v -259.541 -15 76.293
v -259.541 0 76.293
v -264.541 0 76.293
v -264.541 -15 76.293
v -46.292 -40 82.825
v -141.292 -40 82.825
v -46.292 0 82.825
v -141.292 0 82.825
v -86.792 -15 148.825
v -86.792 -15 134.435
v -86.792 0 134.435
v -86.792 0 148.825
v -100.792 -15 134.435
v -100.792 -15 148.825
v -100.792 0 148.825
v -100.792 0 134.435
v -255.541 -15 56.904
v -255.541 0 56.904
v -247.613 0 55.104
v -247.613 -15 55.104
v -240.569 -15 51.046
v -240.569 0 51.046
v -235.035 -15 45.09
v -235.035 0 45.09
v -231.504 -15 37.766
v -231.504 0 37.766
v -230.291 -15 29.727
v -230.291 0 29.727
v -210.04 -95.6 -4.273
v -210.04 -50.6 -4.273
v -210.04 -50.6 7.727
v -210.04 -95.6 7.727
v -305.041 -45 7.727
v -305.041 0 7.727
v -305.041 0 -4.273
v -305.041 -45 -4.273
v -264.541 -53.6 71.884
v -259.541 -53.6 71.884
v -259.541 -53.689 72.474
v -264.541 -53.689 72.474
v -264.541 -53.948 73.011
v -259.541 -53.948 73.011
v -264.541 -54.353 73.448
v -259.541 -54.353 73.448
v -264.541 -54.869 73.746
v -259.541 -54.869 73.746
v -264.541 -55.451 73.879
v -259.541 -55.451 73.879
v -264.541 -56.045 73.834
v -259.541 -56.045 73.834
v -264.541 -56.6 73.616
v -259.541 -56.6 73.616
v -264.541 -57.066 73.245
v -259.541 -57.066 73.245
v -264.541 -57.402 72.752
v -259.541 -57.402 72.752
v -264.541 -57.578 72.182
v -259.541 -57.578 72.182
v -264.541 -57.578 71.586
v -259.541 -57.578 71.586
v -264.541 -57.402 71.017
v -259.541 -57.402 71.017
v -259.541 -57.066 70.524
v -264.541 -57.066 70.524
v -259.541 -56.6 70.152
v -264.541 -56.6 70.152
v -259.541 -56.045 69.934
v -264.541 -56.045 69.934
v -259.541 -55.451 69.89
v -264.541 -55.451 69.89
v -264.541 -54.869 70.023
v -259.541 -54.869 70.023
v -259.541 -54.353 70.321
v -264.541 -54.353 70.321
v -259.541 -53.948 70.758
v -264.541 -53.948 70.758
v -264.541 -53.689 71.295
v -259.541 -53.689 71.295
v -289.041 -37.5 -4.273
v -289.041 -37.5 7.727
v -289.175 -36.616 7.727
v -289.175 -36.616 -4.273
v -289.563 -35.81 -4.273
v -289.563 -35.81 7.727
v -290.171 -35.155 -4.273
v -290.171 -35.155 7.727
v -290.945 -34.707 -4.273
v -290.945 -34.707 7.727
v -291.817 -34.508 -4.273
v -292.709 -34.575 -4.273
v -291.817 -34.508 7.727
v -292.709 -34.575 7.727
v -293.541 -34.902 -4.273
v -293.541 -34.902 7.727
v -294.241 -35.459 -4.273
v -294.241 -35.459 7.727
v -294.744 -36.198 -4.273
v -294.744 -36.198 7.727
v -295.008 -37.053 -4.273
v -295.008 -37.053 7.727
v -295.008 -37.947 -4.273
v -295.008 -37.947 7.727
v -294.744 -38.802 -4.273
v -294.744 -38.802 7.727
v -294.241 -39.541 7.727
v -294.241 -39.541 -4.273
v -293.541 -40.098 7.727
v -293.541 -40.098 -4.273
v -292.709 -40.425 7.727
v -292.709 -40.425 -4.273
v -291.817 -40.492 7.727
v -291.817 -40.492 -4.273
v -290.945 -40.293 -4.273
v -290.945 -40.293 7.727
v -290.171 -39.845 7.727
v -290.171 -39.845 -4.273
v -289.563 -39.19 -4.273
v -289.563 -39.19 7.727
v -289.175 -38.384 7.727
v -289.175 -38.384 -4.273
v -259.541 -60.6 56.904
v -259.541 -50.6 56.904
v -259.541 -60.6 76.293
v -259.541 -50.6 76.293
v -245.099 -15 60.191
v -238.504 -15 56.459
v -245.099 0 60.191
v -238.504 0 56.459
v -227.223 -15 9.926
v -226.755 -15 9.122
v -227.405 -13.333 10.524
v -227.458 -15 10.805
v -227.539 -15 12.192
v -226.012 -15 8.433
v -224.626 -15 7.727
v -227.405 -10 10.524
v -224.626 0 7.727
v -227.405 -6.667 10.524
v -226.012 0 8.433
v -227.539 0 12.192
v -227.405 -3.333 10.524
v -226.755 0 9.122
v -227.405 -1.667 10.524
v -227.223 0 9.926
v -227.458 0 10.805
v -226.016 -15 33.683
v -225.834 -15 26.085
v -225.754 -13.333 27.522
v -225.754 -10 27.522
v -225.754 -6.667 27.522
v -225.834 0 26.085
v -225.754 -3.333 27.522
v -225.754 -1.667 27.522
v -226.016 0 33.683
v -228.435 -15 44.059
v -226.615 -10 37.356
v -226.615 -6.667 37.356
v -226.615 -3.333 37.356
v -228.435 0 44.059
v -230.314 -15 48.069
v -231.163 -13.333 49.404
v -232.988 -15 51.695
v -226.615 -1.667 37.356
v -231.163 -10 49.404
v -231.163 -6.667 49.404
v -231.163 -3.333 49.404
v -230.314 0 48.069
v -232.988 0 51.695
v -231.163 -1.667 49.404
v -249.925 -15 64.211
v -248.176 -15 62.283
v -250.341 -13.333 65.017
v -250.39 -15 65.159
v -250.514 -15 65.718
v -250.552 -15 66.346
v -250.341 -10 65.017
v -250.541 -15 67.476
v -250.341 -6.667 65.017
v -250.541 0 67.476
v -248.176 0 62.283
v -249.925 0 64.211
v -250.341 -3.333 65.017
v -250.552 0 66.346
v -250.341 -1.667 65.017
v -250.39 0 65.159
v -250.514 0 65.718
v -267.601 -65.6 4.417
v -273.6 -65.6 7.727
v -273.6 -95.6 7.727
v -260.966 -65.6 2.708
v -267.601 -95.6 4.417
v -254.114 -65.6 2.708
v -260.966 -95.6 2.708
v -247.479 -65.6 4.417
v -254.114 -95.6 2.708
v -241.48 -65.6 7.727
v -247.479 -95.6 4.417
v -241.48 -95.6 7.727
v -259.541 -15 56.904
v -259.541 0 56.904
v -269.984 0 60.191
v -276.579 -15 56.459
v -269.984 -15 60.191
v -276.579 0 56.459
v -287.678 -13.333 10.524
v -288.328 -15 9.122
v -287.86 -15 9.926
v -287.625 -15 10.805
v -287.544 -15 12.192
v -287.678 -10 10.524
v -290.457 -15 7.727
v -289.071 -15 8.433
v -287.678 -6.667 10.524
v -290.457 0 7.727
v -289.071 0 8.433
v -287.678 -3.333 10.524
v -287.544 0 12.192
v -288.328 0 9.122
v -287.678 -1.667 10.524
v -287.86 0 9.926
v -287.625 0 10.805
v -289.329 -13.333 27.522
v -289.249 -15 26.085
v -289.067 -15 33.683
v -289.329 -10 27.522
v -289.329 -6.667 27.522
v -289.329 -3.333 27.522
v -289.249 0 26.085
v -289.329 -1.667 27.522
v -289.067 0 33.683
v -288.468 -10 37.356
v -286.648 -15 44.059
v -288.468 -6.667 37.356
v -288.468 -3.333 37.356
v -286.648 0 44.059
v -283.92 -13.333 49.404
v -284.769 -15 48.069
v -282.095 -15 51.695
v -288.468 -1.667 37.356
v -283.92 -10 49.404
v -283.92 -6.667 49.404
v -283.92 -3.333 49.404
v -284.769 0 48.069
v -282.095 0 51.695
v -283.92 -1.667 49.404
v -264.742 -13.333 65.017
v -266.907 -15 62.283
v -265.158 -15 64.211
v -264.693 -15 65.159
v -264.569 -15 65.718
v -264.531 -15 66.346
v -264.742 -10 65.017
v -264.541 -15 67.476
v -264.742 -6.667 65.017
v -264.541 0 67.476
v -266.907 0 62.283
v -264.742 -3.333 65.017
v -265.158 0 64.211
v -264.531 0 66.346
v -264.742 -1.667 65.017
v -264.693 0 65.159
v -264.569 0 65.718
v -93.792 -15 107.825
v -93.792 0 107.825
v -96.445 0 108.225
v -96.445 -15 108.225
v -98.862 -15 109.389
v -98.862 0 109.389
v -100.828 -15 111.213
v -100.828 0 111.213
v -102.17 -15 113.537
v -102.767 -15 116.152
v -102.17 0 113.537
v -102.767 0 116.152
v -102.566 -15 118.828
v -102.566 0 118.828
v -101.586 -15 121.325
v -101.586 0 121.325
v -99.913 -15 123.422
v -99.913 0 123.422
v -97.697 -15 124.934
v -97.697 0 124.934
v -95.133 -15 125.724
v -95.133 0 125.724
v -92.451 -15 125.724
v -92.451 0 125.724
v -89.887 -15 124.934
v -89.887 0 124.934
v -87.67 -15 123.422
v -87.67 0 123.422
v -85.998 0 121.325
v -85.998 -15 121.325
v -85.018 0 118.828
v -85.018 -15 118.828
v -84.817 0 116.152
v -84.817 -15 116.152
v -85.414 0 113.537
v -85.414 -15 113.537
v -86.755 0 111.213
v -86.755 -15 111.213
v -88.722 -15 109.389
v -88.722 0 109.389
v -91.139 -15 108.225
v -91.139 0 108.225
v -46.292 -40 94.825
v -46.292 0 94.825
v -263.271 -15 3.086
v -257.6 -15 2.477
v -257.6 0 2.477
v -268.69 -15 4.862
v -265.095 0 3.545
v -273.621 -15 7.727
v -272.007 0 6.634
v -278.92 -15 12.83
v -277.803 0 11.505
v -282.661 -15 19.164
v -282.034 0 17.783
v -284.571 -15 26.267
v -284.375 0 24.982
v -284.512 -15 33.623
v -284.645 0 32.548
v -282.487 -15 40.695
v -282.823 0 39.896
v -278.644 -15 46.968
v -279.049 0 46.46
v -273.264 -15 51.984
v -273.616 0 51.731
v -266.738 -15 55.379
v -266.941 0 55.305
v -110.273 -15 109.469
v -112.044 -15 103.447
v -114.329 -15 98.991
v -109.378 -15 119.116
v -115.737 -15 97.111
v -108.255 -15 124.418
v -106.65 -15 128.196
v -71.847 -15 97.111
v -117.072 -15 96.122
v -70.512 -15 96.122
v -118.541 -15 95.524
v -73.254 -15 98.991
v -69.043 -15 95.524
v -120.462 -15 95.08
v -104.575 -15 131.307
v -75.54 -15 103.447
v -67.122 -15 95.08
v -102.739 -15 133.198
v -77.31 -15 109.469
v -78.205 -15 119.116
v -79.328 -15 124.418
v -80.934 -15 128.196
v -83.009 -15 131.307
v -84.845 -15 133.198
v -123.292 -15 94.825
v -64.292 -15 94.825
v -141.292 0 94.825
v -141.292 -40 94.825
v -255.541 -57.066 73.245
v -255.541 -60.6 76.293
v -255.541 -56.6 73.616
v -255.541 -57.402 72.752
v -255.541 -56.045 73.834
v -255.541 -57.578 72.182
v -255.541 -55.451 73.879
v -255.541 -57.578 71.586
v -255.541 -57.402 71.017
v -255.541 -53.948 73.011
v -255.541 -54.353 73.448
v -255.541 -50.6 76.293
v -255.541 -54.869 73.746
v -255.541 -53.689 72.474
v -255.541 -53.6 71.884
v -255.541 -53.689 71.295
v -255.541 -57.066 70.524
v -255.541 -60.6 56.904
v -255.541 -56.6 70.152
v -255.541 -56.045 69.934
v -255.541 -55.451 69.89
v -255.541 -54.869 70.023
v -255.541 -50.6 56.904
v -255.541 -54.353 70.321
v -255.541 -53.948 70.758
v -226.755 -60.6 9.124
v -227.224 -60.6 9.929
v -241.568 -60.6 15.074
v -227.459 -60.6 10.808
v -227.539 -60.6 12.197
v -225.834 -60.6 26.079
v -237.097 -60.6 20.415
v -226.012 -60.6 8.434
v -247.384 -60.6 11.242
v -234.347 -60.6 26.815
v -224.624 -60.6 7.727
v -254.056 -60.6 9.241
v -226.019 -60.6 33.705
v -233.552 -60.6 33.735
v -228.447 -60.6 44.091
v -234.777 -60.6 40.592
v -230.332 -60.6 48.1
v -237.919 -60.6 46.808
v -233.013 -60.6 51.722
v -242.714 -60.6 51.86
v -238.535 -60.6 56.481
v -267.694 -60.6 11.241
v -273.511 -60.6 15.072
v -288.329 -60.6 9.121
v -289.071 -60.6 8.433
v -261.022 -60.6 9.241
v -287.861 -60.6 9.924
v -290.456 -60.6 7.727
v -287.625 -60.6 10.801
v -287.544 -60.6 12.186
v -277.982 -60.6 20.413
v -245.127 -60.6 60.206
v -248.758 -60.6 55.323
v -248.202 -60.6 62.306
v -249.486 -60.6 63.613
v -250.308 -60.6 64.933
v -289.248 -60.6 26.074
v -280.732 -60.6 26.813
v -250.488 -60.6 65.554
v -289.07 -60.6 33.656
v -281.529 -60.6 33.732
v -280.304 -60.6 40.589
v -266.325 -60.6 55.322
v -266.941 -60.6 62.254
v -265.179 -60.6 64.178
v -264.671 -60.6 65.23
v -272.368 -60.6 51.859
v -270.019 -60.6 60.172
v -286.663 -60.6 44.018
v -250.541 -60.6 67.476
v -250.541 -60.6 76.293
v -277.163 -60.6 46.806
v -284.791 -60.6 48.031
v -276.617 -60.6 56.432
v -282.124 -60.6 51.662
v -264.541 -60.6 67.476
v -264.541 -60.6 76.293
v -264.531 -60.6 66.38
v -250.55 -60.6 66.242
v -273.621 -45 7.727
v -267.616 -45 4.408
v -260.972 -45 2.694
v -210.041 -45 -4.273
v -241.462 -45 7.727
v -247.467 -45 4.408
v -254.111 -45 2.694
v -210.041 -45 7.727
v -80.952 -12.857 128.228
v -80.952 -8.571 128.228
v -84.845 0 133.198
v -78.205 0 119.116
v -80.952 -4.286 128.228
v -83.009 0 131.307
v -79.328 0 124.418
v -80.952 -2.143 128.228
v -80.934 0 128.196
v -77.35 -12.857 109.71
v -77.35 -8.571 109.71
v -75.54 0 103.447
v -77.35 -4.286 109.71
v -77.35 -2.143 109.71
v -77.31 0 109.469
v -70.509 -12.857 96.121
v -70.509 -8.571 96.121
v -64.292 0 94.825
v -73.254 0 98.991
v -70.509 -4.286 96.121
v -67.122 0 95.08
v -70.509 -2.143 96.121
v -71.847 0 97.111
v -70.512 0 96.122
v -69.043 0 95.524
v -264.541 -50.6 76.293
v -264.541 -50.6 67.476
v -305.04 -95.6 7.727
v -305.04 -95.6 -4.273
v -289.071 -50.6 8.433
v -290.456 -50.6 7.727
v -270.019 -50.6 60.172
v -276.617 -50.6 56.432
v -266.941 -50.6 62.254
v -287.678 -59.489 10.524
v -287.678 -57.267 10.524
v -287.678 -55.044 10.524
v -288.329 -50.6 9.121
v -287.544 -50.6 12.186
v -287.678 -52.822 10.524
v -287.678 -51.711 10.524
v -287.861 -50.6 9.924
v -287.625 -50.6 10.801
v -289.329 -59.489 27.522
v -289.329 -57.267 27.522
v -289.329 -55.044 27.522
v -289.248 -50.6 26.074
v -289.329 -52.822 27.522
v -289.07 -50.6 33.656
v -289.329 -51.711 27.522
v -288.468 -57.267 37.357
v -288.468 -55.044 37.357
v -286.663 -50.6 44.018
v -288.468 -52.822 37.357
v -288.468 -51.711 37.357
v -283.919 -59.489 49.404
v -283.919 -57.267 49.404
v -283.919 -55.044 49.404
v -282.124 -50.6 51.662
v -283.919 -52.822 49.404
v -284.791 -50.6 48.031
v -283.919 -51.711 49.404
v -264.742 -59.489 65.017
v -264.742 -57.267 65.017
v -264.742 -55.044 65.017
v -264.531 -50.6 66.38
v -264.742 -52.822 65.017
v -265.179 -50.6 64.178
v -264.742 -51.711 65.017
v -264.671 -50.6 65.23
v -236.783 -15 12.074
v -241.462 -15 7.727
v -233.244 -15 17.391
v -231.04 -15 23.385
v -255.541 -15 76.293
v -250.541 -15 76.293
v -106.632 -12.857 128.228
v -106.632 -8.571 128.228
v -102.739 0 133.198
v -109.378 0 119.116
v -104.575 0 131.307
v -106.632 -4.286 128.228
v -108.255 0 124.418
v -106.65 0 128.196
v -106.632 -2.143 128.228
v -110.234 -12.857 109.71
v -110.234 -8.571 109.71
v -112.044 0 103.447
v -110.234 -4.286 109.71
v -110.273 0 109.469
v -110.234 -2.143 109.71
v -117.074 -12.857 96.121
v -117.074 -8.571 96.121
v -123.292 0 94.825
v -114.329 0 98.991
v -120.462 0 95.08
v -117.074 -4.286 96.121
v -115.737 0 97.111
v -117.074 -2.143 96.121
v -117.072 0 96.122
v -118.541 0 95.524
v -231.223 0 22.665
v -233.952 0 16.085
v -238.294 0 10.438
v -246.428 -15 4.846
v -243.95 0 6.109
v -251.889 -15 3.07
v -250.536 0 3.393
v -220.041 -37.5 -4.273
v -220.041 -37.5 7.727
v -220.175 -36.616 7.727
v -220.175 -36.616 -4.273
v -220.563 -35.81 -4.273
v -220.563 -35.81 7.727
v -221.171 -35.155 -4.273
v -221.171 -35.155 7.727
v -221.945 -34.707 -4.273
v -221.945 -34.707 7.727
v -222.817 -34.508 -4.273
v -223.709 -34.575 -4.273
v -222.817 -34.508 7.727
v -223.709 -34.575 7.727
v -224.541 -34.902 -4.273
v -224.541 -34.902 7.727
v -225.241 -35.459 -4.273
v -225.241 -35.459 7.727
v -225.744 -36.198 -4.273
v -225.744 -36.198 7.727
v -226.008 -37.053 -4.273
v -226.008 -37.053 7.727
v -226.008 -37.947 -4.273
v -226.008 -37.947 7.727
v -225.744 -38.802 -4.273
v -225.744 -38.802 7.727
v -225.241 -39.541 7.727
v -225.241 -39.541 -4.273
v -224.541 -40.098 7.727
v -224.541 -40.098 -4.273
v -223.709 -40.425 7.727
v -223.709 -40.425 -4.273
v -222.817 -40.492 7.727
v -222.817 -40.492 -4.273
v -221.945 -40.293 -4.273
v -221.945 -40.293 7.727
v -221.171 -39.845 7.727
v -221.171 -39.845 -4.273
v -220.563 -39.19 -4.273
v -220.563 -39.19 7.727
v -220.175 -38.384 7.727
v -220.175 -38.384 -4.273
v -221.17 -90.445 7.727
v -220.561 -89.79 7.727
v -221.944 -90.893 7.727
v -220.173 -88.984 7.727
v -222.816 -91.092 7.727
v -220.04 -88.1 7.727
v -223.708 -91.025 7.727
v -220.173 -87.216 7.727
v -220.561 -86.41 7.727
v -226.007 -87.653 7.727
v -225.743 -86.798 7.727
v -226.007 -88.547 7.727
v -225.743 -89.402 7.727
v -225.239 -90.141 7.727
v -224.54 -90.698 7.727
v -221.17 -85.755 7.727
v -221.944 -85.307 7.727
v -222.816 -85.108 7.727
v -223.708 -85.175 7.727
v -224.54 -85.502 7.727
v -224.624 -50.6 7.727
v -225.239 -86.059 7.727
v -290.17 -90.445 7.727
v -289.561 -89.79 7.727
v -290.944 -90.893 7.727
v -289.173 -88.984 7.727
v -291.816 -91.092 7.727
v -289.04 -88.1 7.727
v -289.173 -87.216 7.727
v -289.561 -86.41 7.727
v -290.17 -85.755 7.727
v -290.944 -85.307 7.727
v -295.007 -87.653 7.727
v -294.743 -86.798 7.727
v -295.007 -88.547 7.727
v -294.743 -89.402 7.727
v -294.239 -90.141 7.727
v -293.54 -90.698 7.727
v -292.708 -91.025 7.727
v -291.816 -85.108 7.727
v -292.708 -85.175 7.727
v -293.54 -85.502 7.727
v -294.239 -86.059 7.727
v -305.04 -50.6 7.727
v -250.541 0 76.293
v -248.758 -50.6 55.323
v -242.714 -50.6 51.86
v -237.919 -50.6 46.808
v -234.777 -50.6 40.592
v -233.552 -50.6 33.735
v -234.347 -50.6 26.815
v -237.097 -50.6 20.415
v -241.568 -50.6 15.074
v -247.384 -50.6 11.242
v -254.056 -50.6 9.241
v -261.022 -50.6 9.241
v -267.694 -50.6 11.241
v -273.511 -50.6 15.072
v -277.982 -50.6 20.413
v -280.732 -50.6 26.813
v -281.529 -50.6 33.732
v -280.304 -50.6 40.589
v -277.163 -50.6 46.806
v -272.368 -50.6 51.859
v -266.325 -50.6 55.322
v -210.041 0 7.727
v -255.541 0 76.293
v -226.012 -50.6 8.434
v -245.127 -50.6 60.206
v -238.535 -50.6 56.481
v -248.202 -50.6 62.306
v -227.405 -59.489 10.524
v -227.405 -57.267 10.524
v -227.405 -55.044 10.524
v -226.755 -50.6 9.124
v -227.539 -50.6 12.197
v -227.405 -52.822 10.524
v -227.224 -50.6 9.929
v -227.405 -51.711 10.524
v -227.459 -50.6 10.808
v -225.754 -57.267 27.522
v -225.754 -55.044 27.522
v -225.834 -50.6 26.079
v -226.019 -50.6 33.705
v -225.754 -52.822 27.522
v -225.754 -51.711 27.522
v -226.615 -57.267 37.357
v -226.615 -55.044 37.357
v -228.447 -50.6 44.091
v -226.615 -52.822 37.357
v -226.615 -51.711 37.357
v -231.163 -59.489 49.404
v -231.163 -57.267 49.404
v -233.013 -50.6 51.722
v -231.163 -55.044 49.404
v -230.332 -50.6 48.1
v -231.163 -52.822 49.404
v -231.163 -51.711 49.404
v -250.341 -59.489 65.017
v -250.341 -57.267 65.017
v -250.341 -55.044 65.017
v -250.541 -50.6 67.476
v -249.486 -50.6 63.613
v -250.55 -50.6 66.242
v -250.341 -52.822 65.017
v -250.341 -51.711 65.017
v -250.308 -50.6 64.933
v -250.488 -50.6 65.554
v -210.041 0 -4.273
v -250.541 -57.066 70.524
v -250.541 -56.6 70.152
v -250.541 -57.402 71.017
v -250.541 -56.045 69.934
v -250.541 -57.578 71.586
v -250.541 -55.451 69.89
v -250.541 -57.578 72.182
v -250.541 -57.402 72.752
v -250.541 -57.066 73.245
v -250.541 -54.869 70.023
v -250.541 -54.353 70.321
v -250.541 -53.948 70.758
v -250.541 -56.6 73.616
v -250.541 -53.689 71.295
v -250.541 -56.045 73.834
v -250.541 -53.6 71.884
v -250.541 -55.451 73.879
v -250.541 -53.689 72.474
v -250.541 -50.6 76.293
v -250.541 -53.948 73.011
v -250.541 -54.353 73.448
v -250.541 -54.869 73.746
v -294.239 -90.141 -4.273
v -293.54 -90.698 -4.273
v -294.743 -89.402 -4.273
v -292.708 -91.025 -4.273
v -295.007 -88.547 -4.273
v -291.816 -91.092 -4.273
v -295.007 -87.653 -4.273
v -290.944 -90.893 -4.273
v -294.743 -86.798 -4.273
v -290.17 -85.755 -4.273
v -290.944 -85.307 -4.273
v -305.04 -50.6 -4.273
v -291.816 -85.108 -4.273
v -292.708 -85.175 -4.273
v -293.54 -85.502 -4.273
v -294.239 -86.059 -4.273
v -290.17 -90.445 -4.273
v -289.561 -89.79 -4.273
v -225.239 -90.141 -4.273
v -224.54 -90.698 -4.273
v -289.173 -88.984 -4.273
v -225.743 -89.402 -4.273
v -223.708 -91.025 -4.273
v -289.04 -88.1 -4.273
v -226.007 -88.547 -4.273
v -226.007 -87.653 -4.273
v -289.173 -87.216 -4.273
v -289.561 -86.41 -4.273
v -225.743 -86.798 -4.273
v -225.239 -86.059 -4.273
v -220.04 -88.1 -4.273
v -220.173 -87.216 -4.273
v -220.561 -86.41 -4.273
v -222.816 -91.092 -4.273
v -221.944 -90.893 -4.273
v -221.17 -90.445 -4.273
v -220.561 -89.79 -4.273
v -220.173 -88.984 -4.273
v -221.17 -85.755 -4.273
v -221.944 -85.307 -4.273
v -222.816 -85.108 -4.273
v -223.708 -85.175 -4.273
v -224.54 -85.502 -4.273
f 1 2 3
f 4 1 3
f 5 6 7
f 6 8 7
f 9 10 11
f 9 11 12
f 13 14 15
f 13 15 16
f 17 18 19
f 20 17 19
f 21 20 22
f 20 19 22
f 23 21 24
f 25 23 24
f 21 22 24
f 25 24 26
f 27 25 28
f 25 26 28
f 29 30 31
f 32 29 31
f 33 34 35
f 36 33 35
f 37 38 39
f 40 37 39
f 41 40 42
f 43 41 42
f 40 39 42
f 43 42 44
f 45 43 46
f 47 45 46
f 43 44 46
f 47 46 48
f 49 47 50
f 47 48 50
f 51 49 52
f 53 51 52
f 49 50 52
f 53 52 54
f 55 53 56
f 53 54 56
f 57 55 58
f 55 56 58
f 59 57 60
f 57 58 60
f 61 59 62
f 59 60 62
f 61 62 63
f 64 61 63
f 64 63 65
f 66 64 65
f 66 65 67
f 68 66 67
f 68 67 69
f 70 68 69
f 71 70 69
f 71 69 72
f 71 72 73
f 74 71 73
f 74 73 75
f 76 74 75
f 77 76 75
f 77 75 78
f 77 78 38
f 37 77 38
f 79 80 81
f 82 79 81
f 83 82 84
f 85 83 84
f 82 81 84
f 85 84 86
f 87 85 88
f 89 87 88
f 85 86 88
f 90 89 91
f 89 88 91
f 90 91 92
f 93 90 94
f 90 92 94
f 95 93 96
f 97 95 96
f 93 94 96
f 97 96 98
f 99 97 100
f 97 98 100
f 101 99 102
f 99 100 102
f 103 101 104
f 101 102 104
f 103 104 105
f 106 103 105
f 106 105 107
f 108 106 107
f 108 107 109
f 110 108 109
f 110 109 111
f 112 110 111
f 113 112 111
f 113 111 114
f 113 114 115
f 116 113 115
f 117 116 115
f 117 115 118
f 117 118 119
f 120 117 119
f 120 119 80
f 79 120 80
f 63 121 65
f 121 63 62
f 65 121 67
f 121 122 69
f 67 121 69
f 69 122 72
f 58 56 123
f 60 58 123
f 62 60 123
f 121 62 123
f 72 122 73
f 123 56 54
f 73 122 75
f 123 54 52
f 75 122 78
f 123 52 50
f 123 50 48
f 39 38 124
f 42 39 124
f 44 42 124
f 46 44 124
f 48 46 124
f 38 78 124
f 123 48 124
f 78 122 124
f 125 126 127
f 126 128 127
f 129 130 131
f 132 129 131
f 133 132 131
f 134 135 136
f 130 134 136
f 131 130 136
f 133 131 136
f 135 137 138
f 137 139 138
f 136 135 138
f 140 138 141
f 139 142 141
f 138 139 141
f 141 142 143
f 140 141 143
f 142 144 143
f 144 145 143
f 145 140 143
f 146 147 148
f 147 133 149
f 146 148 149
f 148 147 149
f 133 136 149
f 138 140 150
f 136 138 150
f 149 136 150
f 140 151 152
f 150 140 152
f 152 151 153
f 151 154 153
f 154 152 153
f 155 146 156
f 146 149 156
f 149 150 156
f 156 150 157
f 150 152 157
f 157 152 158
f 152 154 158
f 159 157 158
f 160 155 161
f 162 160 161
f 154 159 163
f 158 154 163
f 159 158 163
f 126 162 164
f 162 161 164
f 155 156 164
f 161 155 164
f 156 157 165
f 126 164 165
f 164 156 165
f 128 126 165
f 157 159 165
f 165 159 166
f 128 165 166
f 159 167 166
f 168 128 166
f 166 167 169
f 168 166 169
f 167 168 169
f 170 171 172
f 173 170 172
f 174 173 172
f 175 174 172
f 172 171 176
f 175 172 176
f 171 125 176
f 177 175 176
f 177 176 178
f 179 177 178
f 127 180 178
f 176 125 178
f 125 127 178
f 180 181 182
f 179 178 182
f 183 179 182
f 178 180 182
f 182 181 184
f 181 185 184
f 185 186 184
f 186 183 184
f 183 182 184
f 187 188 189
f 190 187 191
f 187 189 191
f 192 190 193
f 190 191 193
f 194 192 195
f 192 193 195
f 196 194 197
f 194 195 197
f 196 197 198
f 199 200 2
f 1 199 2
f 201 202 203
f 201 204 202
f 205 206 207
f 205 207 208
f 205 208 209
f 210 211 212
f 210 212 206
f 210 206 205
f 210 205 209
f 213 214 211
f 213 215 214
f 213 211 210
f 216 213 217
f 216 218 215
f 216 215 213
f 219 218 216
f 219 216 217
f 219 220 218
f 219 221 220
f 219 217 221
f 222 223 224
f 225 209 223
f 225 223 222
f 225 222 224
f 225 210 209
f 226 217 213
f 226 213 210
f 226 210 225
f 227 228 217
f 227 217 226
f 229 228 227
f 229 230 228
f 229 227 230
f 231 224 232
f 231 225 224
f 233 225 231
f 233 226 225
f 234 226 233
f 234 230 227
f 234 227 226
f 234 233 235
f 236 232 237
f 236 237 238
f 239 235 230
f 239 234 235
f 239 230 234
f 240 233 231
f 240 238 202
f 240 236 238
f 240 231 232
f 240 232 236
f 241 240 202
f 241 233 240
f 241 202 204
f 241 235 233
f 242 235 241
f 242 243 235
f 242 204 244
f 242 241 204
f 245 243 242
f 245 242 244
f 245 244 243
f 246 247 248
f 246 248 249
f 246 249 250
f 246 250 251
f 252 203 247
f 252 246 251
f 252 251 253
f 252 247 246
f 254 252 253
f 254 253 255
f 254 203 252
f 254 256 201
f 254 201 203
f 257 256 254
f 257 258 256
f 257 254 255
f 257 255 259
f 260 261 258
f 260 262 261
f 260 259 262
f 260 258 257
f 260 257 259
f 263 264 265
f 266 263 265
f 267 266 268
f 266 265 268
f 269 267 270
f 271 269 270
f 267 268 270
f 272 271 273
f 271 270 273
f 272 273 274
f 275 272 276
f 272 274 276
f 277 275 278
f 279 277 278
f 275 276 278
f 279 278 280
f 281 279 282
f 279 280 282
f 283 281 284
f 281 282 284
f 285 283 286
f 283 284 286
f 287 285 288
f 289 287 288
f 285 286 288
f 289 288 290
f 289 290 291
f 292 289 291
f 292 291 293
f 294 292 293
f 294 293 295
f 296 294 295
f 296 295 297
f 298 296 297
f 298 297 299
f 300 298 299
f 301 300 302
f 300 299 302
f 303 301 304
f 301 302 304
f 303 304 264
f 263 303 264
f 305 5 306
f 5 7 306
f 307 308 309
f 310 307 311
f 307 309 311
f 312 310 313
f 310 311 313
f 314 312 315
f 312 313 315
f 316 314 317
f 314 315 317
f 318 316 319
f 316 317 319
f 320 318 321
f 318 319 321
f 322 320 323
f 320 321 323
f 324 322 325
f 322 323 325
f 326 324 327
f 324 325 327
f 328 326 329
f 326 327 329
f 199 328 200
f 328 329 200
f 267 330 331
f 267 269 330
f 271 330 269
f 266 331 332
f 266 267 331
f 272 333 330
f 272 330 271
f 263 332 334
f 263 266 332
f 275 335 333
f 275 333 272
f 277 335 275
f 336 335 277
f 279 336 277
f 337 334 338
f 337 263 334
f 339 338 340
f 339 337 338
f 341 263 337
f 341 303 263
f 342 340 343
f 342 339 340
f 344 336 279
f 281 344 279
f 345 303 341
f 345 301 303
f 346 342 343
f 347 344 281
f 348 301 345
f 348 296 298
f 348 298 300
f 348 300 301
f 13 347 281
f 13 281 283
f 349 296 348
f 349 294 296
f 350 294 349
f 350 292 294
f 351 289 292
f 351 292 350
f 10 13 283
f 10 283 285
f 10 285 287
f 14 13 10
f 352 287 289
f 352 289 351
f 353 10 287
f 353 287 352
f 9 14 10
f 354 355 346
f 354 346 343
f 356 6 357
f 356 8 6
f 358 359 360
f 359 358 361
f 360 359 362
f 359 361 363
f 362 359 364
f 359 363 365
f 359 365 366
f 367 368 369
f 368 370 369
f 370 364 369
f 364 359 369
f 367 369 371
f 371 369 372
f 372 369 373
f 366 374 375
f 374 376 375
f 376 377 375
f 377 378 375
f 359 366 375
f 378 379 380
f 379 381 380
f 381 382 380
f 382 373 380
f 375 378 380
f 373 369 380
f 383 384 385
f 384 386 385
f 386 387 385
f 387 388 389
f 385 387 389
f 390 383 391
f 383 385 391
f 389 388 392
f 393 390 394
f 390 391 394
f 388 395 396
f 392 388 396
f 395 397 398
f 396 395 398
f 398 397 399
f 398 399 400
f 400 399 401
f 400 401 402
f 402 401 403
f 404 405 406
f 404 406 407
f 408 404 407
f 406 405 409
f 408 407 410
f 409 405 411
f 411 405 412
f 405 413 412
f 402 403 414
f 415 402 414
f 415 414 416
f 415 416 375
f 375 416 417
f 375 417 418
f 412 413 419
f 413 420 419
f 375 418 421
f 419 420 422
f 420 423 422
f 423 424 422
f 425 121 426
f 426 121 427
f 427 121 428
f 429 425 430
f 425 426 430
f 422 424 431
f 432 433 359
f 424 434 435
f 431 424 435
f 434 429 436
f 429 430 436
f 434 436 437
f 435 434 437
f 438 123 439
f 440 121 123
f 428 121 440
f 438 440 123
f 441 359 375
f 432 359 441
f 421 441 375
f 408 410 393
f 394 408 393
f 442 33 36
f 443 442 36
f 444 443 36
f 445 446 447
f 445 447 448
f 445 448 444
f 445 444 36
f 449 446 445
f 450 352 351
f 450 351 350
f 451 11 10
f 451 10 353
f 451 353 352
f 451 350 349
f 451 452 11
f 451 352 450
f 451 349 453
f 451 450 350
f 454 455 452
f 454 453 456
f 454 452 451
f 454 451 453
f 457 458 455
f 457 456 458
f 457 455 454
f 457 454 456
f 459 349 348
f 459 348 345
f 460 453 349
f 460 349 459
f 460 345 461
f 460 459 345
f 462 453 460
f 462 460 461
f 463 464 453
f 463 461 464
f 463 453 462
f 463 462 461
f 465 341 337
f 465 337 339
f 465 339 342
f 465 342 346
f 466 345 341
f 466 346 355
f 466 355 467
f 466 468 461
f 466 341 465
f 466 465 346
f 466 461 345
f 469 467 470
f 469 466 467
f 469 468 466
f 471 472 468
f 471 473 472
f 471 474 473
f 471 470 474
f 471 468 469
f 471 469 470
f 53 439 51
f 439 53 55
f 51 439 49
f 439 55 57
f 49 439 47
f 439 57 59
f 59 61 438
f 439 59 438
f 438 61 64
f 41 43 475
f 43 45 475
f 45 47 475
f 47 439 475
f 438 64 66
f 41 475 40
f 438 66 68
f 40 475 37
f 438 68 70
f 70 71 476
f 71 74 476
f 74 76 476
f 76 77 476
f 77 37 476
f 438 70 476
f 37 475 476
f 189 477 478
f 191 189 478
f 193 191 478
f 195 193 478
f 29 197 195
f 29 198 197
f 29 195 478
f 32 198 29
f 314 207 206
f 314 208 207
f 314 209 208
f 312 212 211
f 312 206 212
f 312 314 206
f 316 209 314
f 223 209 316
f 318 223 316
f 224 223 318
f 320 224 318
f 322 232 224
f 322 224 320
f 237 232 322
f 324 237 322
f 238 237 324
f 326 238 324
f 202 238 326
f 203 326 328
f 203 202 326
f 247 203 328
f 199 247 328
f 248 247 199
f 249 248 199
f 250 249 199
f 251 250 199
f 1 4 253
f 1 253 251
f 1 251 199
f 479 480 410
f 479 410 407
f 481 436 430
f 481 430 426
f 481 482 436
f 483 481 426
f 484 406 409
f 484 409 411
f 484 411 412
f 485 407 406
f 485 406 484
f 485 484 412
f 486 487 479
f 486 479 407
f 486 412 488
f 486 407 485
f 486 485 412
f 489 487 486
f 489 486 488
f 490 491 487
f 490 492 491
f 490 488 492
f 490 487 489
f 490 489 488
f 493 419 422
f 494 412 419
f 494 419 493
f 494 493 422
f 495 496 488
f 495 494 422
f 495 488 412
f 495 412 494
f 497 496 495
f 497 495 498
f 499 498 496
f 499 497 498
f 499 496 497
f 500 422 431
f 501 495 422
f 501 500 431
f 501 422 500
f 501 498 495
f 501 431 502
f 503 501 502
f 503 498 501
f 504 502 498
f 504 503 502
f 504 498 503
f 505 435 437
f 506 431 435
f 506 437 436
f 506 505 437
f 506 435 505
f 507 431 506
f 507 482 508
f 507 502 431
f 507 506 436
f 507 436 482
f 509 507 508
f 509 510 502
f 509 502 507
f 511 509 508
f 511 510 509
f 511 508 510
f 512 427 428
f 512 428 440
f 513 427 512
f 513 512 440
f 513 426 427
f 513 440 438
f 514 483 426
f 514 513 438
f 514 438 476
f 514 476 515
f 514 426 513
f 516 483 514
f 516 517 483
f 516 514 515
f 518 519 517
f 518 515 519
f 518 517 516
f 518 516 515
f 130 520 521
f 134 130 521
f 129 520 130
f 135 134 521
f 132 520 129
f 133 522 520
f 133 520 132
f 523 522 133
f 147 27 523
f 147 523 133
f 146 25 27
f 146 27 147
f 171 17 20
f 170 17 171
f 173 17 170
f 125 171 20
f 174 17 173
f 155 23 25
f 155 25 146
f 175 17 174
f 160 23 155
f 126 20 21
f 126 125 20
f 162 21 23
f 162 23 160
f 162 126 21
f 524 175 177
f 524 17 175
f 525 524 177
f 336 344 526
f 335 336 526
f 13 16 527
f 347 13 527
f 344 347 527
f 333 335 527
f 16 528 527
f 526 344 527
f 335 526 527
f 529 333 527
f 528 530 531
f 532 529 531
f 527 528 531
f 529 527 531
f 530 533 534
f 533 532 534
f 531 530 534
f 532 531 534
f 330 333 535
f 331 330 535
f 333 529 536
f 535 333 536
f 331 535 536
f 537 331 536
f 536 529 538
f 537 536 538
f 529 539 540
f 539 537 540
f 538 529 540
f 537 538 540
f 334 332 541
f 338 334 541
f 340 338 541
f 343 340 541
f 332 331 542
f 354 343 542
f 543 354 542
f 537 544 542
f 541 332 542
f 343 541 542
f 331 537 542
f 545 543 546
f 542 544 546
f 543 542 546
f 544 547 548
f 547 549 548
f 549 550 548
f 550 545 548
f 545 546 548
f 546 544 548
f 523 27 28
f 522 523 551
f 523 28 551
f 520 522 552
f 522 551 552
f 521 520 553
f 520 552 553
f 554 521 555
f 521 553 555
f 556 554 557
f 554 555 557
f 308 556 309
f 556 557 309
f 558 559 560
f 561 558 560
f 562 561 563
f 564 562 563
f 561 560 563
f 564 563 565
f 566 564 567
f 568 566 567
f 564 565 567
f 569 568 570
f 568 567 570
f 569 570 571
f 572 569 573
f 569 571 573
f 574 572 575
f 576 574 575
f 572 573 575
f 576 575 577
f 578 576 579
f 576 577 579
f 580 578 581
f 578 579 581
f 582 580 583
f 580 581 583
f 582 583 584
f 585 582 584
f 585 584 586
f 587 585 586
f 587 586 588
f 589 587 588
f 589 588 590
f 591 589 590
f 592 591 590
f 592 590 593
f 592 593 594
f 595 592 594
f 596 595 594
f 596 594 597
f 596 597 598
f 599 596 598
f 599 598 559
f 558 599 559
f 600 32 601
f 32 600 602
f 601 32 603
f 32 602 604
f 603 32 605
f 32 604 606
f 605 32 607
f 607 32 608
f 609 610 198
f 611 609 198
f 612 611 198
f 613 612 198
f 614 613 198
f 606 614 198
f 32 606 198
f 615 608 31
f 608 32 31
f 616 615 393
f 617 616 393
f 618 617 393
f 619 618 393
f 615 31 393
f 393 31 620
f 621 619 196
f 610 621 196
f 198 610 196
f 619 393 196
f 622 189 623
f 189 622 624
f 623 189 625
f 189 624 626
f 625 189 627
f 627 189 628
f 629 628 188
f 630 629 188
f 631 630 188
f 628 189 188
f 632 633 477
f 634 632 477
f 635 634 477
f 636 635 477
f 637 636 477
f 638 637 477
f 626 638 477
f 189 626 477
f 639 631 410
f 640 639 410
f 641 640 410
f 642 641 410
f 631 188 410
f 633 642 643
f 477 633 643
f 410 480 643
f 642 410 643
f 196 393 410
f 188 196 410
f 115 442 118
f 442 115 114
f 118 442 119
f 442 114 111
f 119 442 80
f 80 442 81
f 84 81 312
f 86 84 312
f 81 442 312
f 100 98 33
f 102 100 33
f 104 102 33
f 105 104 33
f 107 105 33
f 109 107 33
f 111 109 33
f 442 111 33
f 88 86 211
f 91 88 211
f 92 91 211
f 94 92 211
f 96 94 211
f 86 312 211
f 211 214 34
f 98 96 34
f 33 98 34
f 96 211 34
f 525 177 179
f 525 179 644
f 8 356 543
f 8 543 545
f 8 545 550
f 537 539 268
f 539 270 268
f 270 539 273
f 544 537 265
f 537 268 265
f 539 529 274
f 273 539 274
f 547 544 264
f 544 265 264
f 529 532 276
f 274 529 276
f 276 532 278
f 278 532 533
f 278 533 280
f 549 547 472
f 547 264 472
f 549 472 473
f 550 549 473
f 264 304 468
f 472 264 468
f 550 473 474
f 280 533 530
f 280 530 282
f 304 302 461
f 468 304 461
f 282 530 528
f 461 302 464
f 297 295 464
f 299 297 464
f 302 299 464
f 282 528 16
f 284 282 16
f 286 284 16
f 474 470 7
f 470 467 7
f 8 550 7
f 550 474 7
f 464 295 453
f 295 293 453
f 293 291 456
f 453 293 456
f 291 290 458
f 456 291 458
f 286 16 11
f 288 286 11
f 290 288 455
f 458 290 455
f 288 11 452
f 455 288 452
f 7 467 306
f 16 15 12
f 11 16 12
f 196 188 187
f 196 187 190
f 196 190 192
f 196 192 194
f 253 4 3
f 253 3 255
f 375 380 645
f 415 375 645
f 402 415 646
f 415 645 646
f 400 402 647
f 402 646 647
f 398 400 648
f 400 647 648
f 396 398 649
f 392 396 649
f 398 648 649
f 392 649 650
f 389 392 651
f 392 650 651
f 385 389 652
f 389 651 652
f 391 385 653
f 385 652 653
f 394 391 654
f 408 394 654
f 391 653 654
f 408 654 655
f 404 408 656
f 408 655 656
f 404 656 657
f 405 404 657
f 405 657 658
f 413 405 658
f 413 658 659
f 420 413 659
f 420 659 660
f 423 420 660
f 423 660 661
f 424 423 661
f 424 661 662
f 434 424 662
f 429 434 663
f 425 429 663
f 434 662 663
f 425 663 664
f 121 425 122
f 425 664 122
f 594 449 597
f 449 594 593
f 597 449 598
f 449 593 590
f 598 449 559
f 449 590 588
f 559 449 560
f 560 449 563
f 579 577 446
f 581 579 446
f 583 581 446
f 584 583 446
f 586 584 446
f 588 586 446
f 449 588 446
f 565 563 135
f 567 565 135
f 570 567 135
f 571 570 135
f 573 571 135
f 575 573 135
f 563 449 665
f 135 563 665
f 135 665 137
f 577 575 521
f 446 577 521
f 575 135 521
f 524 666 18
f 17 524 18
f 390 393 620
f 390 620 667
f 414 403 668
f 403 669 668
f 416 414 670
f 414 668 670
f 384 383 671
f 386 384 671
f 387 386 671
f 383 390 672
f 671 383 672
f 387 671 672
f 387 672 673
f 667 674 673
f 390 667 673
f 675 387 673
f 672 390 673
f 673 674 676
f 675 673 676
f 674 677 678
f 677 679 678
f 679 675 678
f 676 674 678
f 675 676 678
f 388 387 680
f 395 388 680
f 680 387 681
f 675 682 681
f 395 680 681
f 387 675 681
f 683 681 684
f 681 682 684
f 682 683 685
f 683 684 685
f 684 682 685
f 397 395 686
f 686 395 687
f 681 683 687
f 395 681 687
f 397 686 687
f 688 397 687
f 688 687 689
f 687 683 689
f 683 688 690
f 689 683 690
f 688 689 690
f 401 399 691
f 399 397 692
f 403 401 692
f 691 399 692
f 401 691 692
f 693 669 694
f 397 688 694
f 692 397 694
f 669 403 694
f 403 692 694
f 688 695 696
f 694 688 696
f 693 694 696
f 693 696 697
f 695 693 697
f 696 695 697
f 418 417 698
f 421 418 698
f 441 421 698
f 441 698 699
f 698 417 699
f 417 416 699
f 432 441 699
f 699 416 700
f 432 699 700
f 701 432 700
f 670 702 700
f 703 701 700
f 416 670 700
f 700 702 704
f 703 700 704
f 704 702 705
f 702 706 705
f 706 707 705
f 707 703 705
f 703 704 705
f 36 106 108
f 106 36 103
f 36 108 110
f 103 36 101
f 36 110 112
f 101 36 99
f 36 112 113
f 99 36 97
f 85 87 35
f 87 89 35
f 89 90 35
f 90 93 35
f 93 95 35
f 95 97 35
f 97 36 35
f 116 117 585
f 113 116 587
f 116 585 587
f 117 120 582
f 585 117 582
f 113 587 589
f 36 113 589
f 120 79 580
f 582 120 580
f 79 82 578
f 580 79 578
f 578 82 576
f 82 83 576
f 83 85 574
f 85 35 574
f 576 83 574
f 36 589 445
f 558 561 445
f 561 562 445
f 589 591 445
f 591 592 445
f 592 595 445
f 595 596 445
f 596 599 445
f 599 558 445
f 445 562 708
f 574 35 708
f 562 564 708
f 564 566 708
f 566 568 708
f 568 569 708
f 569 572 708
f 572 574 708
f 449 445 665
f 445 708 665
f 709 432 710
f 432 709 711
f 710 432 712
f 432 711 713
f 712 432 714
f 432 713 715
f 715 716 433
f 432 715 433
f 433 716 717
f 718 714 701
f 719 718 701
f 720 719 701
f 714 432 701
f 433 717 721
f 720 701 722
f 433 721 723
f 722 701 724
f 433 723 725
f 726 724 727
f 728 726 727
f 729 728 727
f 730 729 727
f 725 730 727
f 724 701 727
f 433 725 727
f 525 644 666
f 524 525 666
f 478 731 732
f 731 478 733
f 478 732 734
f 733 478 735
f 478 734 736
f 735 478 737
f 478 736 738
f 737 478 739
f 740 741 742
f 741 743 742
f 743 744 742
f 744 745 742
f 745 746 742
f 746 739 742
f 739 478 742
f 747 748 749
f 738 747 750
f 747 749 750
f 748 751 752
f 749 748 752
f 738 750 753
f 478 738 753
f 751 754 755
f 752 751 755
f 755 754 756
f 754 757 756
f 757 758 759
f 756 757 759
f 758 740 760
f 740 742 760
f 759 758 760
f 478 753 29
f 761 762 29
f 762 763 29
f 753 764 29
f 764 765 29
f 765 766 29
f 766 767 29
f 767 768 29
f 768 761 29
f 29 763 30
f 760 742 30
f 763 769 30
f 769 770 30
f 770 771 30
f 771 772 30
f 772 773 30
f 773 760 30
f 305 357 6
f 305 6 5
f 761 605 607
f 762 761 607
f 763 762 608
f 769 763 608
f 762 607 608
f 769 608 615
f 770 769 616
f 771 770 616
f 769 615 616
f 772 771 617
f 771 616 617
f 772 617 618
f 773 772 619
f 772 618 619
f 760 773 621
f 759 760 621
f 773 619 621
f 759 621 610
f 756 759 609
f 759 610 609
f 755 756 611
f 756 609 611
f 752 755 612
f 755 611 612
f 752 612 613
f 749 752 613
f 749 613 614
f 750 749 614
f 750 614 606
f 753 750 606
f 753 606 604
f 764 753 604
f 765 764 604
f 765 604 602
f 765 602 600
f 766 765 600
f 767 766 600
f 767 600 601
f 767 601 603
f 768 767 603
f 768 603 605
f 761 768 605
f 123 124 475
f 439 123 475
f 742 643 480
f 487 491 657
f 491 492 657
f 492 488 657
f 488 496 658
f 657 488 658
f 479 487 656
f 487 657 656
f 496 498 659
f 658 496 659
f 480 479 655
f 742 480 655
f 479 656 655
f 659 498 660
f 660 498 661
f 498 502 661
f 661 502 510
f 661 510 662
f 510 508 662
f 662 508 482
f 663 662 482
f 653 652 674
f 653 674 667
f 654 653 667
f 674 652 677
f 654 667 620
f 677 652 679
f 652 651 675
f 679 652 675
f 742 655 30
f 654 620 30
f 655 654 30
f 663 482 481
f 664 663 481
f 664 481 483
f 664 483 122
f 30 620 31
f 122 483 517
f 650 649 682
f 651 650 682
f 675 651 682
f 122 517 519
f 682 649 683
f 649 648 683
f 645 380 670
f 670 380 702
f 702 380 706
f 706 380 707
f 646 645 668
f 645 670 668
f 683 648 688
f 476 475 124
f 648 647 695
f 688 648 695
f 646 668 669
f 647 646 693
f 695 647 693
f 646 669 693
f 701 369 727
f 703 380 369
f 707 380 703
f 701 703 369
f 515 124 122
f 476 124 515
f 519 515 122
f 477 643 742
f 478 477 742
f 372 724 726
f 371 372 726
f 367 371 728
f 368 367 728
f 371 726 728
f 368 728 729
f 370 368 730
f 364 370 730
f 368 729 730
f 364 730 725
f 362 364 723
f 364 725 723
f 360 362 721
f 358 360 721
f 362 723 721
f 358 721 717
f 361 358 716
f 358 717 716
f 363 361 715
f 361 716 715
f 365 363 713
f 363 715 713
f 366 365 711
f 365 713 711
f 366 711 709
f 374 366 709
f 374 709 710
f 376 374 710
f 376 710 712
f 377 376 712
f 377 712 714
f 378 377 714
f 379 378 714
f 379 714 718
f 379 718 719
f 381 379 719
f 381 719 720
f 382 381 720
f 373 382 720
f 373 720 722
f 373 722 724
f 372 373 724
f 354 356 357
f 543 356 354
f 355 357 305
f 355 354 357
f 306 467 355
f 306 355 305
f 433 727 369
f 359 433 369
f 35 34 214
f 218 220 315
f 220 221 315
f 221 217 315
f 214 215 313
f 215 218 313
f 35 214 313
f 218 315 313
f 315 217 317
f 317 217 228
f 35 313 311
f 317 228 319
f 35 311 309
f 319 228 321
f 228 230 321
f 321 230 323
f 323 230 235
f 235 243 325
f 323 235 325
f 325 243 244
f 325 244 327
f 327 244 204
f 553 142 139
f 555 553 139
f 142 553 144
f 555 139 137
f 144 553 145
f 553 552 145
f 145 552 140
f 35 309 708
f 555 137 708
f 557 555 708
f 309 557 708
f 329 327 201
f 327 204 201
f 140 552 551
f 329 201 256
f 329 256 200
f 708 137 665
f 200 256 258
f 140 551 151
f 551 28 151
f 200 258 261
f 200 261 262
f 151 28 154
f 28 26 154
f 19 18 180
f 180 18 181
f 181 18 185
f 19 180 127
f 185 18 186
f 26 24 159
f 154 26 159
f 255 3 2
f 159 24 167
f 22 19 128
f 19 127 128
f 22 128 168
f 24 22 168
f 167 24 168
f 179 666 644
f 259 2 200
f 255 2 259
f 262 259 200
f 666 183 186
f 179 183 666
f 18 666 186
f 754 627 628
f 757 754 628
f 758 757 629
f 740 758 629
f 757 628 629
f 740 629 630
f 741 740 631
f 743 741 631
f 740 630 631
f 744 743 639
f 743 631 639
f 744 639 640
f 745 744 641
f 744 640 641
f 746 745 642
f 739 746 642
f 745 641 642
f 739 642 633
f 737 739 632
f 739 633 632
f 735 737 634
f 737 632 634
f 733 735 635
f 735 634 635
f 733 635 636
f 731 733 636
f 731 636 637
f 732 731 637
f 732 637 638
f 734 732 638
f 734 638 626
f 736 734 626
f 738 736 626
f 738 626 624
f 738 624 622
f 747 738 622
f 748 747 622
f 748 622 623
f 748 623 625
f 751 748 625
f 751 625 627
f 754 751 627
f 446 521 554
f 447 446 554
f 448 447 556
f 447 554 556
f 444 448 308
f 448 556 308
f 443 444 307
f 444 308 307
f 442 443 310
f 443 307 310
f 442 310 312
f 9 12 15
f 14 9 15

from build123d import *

# Parameters (mm, degrees)
F1_DEPTH  = 15
F2_W      = 95
F2_H      = 12
F3_DEPTH  = 25
F5_DEPTH  = 30
F6_R      = 3
F7_DEPTH  = 25
F10_DEPTH = 10
F11_DEPTH = 45
F12_R     = 3
F13_DEPTH = 25
F14_R     = 2
F15_DEPTH = 25
F16_R     = 27.25
F17_DEPTH = 30


with BuildPart() as f1:
    # F0 (on Front) → F1 (new body)
    with BuildSketch(Plane.XZ):
        with BuildLine():
            Line((-86.7919104606, 148.8248279665), (-93.7919104606, 148.8248279665))
            Line((-93.7919104606, 148.8248279665), (-93.7919104606, 125.8248279665))
            ThreePointArc((-93.7919104606, 125.8248279665), (-84.7919104606, 116.8248279665), (-93.7919104606, 107.8248279665))
            Line((-93.7919104606, 107.8248279665), (-93.7919104606, 82.8248279665))
            Line((-93.7919104606, 82.8248279665), (-46.2919104606, 82.8248279665))
            Line((-46.2919104606, 82.8248279665), (-46.2919104606, 94.8248279665))
            Line((-46.2919104606, 94.8248279665), (-64.2919104606, 94.8248279665))
            add(Edge.make_bspline(
                [(-86.7919104606, 134.4346182567), (-84.6186229965, 133.5189465859), (-80.1312288241, 128.2356920468), (-77.8141041543, 119.2857314457), (-77.824550096, 109.8854181171), (-75.6822417412, 103.3950594754), (-73.7904940331, 99.9910254255), (-71.3124707915, 95.2952731617), (-65.4873071613, 94.8248279665), (-64.2919104606, 94.8248279665)],
                knots=[0, 0, 0, 0, 0.1589153696, 0.3266349591, 0.4941602985, 0.6338202377, 0.7405177517, 0.8628095578, 1, 1, 1, 1], degree=3))
            Line((-86.7919104606, 134.4346182567), (-86.7919104606, 148.8248279665))
        make_face()
        with BuildLine():
            Line((-93.7919104606, 125.8248279665), (-93.7919104606, 148.8248279665))
            Line((-93.7919104606, 148.8248279665), (-100.7919104606, 148.8248279665))
            Line((-100.7919104606, 148.8248279665), (-100.7919104606, 134.4346182567))
            add(Edge.make_bspline(
                [(-100.7919104606, 134.4346182567), (-102.9651979248, 133.5189465859), (-107.4525920971, 128.2356920468), (-109.7697167669, 119.2857314457), (-109.7592708252, 109.8854181171), (-111.90157918, 103.3950594754), (-113.7933268881, 99.9910254255), (-116.2713501297, 95.2952731617), (-122.09651376, 94.8248279665), (-123.2919104606, 94.8248279665)],
                knots=[0, 0, 0, 0, 0.1589153696, 0.3266349591, 0.4941602985, 0.6338202377, 0.7405177517, 0.8628095578, 1, 1, 1, 1], degree=3))
            Line((-123.2919104606, 94.8248279665), (-141.2919104606, 94.8248279665))
            Line((-141.2919104606, 94.8248279665), (-141.2919104606, 82.8248279665))
            Line((-141.2919104606, 82.8248279665), (-93.7919104606, 82.8248279665))
            Line((-93.7919104606, 82.8248279665), (-93.7919104606, 107.8248279665))
            ThreePointArc((-93.7919104606, 107.8248279665), (-102.7919104606, 116.8248279665), (-93.7919104606, 125.8248279665))
        make_face()
    extrude(amount=F1_DEPTH)

    # F2 (on face) → F3 (join)
    with BuildSketch(Plane.XZ.offset(15)):
        with Locations((-93.7919104606, 88.8248279665)):
            Rectangle(F2_W, F2_H)
    extrude(amount=F3_DEPTH)


with BuildPart() as f1b:
    # F0 (on Front) → F1, piece 2 (new body)
    with BuildSketch(Plane.XZ):
        with BuildLine():
            Line((-257.6000979949, -4.2727524898), (-257.6000979949, 2.477310532))
            ThreePointArc((-257.6000979949, 2.477310532), (-284.7741725177, 28.7558565069), (-259.5414917918, 56.9037539082))
            Line((-259.5414917918, 56.9037539082), (-259.5414917918, 76.2926292618))
            Line((-259.5414917918, 76.2926292618), (-264.5414917918, 76.2926292618))
            Line((-264.5414917918, 76.2926292618), (-264.5414917918, 67.4756121834))
            add(Edge.make_bspline(
                [(-290.4570249768, 7.7272475102), (-289.1810761401, 8.2052664847), (-287.0610478005, 9.7665971379), (-288.0067907257, 16.4907230197), (-289.8129929509, 27.7294023947), (-288.7695339108, 37.3587296696), (-285.2655736169, 50.133144334), (-274.6249586166, 58.2213743066), (-268.4604919275, 60.6121886454), (-264.1794193992, 64.7409361805), (-264.5762423932, 66.6883398304), (-264.5414917918, 67.4756121834)],
                knots=[0, 0, 0, 0, 0.0754379169, 0.1766112941, 0.3150596134, 0.4432663677, 0.5896926426, 0.7356900989, 0.8426999539, 0.935912944, 1, 1, 1, 1], degree=3))
            Line((-290.4570249768, 7.7272475102), (-305.0414917918, 7.7272475102))
            Line((-305.0414917918, 7.7272475102), (-305.0414917918, -4.2727524898))
            Line((-305.0414917918, -4.2727524898), (-257.6000979949, -4.2727524898))
        make_face()
        with BuildLine():
            ThreePointArc((-255.5414917918, 56.9037539082), (-237.5782443105, 48.2753269256), (-230.2914917918, 29.7272475102))
            ThreePointArc((-230.2914917918, 29.7272475102), (-238.2935635791, 10.4378784299), (-257.6000979949, 2.477310532))
            Line((-257.6000979949, 2.477310532), (-257.6000979949, -4.2727524898))
            Line((-257.6000979949, -4.2727524898), (-257.4828855888, -4.2727524898))
            Line((-257.4828855888, -4.2727524898), (-210.0414917918, -4.2727524898))
            Line((-210.0414917918, -4.2727524898), (-210.0414917918, 7.7272475102))
            Line((-210.0414917918, 7.7272475102), (-224.6259586068, 7.7272475102))
            add(Edge.make_bspline(
                [(-224.6259586068, 7.7272475102), (-225.9019074436, 8.2052664847), (-228.0219357831, 9.7665971379), (-227.076192858, 16.4907230197), (-225.2699906328, 27.7294023947), (-226.3134496728, 37.3587296696), (-229.8174099667, 50.133144334), (-240.458024967, 58.2213743066), (-246.6224916561, 60.6121886454), (-250.9035641845, 64.7409361805), (-250.5067411904, 66.6883398304), (-250.5414917918, 67.4756121834)],
                knots=[0, 0, 0, 0, 0.0754379169, 0.1766112941, 0.3150596134, 0.4432663677, 0.5896926426, 0.7356900989, 0.8426999539, 0.935912944, 1, 1, 1, 1], degree=3))
            Line((-250.5414917918, 67.4756121834), (-250.5414917918, 76.2926292618))
            Line((-250.5414917918, 76.2926292618), (-255.5414917918, 76.2926292618))
            Line((-255.5414917918, 76.2926292618), (-255.5414917918, 56.9037539082))
        make_face()
    extrude(amount=F1_DEPTH)

    # F4 (on face) → F5 (join)
    with BuildSketch(Plane.XZ.offset(15)):
        with BuildLine():
            Line((-305.0414917918, 7.7272475102), (-305.0414917918, -4.2727524898))
            Line((-305.0414917918, -4.2727524898), (-210.0414917918, -4.2727524898))
            Line((-210.0414917918, -4.2727524898), (-210.0414917918, 7.7272475102))
            Line((-210.0414917918, 7.7272475102), (-224.6259586068, 7.7272475102))
            Line((-224.6259586068, 7.7272475102), (-241.4616130609, 7.7272475102))
            ThreePointArc((-241.4616130609, 7.7272475102), (-257.5414917918, 2.4772475102), (-273.6213705227, 7.7272475102))
            Line((-273.6213705227, 7.7272475102), (-290.4570249768, 7.7272475102))
            Line((-290.4570249768, 7.7272475102), (-305.0414917918, 7.7272475102))
        make_face()
    extrude(amount=F5_DEPTH)

    # F6 (on face) → F7 (cut)
    with BuildSketch(Plane.XY.offset(7.7272475102)):
        with Locations((-292.0414917918, -37.5)):
            Circle(F6_R)
        with Locations((-223.0414917918, -37.5)):
            Circle(F6_R)
    extrude(amount=-F7_DEPTH, mode=Mode.SUBTRACT)


with BuildPart() as f10:
    # F9 (on offset) → F10 (new body)
    with BuildSketch(Plane.XZ.offset(50.6)):
        with BuildLine():
            add(Edge.make_bspline(
                [(-290.455551815, 7.7273002081), (-289.1797665747, 8.2052578931), (-287.0615437343, 9.7671952257), (-288.006424145, 16.4907827685), (-289.8129423825, 27.7295801069), (-288.7693943306, 37.3588750622), (-285.2654603329, 50.1332954807), (-274.624838932, 58.2215372753), (-268.4603720109, 60.612313356), (-264.179344769, 64.741126533), (-264.5761058805, 66.6883149459), (-264.541356201, 67.4755664124)],
                knots=[0, 0, 0, 0, 0.0754282446, 0.1766029589, 0.3150531081, 0.4432615569, 0.589689767, 0.7356891528, 0.8427004222, 0.9359146443, 1, 1, 1, 1], degree=3))
            Line((-290.455551815, 7.7273002081), (-224.624485445, 7.7273002081))
            add(Edge.make_bspline(
                [(-224.624485445, 7.7273002081), (-225.900623414, 8.2053900387), (-228.0223985318, 9.7663759145), (-227.0758422102, 16.4909243477), (-225.2699356677, 27.7295411797), (-226.3133113838, 37.3588860018), (-229.8172964545, 50.1332957727), (-240.4579048632, 58.2215259245), (-246.6223729542, 60.6123432304), (-250.903444844, 64.7410820148), (-250.5066225949, 66.6885016716), (-250.541372776, 67.475764503)],
                knots=[0, 0, 0, 0, 0.0754490989, 0.1766212525, 0.3150678974, 0.4432731011, 0.5896976051, 0.7356932955, 0.8427018564, 0.9359137191, 1, 1, 1, 1], degree=3))
            Line((-250.541372776, 67.475764503), (-250.541372776, 76.2927815814))
            Line((-250.541372776, 76.2927815814), (-255.541372776, 76.2927815814))
            Line((-255.541372776, 76.2927815814), (-255.541372776, 56.9039062278))
            ThreePointArc((-255.541372776, 56.9039062278), (-257.538991525, 8.9872850622), (-259.541356201, 56.9037081371))
            Line((-259.541356201, 56.9037081371), (-259.541356201, 76.2925834908))
            Line((-259.541356201, 76.2925834908), (-264.541356201, 76.2925834908))
            Line((-264.541356201, 76.2925834908), (-264.541356201, 67.4755664124))
        make_face()
    extrude(amount=F10_DEPTH)

    # F9 (on offset) → F11 (join)
    with BuildSketch(Plane.XZ.offset(50.6)):
        Polygon((-224.624485445, 7.7273002081), (-290.455551815, 7.7273002081), (-305.04001863, 7.7273002081), (-305.04001863, -4.2726997919), (-257.5986248331, -4.2726997919), (-257.5401800738, -4.2726997919), (-210.04001863, -4.2726997919), (-210.04001863, 7.7273002081), align=None)
    extrude(amount=F11_DEPTH)

    # F12 (on face) → F13 (cut)
    with BuildSketch(Plane.XY.offset(7.7273002081)):
        with Locations((-292.04001863, -88.1)):
            Circle(F12_R)
        with Locations((-223.04001863, -88.1)):
            Circle(F12_R)
    extrude(amount=-F13_DEPTH, mode=Mode.SUBTRACT)

    # F14 (on face) → F15 (cut)
    with BuildSketch(Plane.YZ.offset(-250.541372776)):
        with Locations((-55.6, 71.8842730422)):
            Circle(F14_R)
    extrude(amount=-F15_DEPTH, mode=Mode.SUBTRACT)

    # F16 (on face) → F17 (cut)
    with BuildSketch(Plane.XZ.offset(95.6)):
        with Locations((-257.5401800738, 29.7416710442)):
            Circle(F16_R)
    extrude(amount=-F17_DEPTH, mode=Mode.SUBTRACT)


solid = Compound([f1.part, f1b.part, f10.part])
